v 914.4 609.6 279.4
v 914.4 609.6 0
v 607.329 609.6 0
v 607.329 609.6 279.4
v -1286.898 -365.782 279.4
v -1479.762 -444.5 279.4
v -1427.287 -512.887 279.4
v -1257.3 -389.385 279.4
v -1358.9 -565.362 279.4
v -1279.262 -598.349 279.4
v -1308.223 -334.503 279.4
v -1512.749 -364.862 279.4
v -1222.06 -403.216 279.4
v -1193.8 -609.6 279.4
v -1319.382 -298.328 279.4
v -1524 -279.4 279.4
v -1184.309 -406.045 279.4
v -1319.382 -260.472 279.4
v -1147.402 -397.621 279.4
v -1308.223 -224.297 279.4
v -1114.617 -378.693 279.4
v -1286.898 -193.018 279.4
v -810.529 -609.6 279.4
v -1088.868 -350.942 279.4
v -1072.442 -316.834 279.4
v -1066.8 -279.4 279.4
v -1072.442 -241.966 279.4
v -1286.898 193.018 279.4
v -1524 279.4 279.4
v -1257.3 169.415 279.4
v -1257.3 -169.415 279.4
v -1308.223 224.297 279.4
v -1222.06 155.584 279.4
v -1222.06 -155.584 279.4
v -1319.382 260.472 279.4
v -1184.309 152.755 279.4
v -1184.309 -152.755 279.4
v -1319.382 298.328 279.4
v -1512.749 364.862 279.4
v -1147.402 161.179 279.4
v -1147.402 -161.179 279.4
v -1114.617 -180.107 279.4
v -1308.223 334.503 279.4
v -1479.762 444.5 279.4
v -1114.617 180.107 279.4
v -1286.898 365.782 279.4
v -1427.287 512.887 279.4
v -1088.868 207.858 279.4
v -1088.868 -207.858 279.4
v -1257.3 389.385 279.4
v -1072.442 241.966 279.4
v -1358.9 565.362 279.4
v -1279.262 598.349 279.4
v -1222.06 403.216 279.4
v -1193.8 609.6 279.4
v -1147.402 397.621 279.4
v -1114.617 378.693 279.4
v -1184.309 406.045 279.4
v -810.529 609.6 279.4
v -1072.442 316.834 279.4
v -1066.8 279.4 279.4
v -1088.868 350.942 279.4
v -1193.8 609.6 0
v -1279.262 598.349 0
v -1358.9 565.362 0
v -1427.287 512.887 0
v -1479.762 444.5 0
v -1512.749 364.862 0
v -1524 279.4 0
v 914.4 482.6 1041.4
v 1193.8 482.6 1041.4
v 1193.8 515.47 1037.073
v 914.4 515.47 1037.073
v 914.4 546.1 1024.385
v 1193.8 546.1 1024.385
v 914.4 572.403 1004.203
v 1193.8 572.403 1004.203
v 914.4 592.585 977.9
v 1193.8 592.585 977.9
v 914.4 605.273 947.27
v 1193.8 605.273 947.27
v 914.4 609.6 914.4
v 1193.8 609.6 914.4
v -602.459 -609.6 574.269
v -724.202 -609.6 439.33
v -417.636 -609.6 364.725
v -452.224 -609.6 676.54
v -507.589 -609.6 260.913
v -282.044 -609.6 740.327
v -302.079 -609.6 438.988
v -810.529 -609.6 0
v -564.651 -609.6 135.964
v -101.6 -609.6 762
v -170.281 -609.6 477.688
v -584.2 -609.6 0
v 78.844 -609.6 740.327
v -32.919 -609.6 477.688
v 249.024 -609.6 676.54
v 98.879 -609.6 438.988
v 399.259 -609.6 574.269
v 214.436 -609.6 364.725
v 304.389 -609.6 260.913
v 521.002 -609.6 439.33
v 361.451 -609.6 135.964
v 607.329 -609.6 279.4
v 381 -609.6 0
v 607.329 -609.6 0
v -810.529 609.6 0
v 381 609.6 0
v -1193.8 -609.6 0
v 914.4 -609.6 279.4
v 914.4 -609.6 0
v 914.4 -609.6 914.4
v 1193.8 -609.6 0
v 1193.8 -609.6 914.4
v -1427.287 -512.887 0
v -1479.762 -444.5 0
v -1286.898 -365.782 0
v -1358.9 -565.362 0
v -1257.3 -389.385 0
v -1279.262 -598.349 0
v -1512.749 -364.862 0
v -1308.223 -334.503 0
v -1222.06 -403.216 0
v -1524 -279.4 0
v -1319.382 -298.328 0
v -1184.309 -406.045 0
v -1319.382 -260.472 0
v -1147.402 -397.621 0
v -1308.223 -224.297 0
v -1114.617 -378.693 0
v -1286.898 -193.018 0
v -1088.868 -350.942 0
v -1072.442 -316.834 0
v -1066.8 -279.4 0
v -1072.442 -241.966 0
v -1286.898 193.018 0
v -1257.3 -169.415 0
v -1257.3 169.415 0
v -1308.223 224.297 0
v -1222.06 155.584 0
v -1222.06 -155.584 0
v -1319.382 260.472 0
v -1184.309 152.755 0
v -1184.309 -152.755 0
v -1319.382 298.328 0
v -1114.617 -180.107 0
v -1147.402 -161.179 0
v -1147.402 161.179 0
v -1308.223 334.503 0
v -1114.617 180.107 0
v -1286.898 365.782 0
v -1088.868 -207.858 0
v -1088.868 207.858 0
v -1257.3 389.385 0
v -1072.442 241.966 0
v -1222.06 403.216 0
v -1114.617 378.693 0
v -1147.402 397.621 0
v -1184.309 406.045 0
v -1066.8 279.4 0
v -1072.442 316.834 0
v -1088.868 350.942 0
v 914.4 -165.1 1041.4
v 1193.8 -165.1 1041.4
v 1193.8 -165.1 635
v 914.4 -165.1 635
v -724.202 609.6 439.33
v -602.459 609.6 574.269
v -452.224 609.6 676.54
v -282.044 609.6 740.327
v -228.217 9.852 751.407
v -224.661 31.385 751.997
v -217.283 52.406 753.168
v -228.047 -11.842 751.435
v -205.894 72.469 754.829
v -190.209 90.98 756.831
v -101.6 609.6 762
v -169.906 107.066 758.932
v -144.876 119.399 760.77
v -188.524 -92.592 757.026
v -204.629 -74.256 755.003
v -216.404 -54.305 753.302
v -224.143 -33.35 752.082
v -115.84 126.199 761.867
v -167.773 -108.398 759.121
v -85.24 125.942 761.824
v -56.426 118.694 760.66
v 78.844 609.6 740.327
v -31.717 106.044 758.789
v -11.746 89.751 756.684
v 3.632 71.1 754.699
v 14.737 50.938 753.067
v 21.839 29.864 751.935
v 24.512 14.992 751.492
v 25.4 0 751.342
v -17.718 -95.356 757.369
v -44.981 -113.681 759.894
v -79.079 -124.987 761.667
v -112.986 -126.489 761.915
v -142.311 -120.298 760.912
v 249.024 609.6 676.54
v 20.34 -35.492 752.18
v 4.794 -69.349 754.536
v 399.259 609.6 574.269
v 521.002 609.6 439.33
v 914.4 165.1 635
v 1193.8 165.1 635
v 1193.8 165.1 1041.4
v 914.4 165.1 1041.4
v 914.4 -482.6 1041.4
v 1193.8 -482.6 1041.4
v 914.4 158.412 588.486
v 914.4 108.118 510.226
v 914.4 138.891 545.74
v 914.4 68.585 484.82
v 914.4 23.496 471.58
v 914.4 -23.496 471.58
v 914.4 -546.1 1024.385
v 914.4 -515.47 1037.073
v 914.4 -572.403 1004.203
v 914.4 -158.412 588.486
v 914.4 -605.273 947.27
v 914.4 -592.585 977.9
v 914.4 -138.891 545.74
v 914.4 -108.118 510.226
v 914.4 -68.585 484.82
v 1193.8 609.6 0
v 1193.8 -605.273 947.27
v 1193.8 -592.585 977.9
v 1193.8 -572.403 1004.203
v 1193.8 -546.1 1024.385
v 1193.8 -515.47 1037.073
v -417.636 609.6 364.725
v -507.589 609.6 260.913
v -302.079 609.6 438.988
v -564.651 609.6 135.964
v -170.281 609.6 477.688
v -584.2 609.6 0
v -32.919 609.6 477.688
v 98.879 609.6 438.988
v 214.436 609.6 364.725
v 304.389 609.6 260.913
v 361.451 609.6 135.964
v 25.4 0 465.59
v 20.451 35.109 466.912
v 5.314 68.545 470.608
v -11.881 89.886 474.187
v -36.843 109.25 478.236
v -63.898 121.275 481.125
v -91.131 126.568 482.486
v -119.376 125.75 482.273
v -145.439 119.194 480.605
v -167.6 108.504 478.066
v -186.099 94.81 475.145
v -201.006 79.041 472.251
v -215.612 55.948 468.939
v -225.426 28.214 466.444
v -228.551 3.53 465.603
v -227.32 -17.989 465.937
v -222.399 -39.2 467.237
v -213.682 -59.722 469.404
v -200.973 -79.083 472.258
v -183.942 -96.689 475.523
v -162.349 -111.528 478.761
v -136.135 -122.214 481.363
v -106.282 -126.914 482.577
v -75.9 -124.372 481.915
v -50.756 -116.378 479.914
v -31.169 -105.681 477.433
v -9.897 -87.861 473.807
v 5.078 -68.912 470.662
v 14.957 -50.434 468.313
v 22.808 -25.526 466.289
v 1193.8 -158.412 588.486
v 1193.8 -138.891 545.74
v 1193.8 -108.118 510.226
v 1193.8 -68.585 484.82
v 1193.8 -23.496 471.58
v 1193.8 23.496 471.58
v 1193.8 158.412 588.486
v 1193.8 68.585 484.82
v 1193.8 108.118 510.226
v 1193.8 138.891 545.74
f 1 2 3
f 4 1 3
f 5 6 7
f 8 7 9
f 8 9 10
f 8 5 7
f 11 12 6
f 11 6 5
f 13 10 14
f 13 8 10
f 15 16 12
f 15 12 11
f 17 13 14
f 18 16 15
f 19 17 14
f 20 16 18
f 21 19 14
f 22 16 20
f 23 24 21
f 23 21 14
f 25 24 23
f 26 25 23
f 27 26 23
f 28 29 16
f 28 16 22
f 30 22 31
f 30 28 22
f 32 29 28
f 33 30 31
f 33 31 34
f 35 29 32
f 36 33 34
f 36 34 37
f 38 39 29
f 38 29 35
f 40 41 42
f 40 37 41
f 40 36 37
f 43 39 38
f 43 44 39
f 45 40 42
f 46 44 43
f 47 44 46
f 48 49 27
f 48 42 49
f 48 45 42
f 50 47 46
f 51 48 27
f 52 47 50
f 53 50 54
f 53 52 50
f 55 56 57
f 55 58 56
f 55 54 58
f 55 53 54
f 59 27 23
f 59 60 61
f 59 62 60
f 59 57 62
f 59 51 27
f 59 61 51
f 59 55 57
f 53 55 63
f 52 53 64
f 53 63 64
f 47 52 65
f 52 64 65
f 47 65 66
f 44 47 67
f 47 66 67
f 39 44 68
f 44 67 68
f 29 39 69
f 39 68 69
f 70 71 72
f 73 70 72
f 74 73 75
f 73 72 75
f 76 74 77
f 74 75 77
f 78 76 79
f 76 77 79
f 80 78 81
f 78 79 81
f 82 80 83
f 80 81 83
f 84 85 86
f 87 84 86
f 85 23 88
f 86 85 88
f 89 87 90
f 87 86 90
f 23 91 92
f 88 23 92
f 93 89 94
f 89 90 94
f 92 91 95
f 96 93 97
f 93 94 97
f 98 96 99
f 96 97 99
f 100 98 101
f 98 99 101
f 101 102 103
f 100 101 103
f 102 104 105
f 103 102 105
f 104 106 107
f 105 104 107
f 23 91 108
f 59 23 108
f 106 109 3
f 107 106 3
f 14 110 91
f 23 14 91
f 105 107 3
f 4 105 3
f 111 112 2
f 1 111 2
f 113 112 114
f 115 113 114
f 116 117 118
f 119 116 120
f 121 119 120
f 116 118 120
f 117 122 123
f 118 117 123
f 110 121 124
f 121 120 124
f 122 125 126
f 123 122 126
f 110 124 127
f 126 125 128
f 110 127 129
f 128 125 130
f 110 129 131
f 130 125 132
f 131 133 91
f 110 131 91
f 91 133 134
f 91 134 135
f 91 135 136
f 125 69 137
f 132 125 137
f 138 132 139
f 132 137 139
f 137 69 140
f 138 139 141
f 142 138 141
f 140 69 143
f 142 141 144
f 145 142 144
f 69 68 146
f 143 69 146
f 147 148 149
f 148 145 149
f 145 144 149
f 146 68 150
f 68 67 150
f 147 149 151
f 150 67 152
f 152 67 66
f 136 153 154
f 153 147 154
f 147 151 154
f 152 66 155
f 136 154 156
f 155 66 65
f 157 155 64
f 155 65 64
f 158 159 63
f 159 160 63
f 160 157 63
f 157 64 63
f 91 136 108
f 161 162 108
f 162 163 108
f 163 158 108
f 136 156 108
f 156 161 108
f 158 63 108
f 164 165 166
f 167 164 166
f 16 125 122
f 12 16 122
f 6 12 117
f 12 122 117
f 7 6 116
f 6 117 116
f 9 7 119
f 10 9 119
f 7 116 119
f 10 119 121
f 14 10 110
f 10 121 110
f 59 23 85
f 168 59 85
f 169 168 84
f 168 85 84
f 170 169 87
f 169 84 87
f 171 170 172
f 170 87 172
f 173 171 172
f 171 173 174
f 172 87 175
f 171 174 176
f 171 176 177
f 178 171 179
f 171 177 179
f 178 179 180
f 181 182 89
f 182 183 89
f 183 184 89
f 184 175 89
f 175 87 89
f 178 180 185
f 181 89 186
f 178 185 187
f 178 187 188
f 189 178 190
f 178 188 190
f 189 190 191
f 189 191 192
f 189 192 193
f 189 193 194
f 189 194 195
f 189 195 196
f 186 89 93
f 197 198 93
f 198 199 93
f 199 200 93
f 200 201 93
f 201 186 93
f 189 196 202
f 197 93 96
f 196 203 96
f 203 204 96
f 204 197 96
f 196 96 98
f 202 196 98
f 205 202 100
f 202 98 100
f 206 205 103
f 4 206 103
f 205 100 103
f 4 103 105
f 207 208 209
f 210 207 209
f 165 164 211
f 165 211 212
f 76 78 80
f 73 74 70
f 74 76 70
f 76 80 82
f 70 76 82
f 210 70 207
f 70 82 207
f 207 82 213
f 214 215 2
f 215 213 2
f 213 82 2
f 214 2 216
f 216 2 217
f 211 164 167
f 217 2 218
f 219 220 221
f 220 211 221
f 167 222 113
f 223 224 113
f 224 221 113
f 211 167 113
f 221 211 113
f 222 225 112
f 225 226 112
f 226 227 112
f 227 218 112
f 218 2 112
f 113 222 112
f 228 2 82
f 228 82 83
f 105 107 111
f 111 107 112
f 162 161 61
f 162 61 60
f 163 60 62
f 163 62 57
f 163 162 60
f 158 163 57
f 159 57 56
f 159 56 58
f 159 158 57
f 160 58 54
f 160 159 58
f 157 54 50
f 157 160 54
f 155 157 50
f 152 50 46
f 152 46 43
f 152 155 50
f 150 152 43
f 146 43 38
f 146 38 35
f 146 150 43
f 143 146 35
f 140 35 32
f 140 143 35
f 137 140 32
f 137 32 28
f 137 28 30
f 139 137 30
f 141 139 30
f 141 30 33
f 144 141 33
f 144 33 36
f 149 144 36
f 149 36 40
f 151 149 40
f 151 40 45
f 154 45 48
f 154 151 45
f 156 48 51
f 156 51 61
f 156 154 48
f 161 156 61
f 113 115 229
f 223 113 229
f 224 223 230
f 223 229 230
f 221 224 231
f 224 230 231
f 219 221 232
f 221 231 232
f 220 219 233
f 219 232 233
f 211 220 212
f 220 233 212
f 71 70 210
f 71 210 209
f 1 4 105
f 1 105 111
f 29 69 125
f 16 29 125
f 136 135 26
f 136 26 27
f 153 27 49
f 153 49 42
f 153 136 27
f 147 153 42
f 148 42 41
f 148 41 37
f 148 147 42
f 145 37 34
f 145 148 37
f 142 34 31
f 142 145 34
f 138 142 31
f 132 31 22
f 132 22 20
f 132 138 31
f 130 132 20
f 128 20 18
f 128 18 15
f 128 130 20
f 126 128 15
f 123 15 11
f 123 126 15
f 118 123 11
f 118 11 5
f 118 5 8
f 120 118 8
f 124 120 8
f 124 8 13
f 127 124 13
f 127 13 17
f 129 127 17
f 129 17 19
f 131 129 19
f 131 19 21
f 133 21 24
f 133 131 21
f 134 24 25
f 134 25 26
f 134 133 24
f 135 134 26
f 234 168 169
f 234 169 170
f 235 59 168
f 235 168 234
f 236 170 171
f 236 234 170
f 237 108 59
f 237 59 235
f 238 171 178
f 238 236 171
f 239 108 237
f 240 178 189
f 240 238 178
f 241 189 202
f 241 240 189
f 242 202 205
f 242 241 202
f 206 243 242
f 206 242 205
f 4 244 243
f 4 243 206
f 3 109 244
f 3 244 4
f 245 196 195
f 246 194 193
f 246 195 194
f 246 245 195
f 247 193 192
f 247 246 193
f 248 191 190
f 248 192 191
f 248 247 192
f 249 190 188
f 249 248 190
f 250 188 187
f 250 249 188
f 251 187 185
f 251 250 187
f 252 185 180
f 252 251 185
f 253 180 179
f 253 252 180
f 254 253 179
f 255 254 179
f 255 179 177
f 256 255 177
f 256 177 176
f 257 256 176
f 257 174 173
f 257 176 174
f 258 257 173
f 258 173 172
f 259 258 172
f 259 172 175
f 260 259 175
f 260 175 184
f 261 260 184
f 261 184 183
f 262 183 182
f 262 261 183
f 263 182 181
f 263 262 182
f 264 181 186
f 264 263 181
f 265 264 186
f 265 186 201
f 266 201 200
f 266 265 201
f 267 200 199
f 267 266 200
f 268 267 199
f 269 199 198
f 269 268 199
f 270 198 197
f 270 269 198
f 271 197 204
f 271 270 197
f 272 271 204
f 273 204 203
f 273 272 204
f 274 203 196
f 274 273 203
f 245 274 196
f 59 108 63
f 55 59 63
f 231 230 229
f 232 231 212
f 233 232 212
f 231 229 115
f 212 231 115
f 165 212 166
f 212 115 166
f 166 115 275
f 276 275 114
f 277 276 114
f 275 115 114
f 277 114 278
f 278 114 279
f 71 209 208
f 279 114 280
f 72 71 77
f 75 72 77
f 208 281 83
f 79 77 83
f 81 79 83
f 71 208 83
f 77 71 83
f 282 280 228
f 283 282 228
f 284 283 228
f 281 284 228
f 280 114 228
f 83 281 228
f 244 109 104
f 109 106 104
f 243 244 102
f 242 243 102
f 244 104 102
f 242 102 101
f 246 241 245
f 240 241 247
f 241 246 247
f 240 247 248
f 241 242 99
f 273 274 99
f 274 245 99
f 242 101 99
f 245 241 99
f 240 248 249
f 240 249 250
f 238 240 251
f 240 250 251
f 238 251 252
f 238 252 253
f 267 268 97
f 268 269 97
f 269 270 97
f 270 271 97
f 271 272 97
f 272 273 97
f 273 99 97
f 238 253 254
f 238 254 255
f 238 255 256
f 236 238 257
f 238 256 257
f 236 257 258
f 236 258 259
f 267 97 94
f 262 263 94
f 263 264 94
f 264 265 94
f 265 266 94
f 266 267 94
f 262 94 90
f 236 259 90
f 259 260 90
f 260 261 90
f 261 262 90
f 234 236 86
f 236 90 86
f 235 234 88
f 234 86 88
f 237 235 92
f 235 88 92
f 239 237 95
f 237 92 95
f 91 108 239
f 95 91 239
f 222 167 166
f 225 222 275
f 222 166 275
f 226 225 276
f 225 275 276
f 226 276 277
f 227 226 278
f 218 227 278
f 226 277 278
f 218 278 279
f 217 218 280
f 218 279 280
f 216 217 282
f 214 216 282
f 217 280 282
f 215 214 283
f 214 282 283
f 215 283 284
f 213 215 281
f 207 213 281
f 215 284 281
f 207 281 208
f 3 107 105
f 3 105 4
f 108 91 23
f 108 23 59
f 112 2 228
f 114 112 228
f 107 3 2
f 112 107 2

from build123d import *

# Parameters (mm, degrees)
F1_W      = 53.071484662
F1_H      = 1219.2
F3_DEPTH  = 279.4
F1_W_2    = 279.4
F1_H_2    = 444.5
F1_H_3    = 330.2
F4_DEPTH  = 1041.4
F1_W_3    = 1417.857030676
F1_R      = 127
F5_DEPTH  = 762
F6_DEPTH  = 279.4
F7_DEPTH  = 15240
F9_DEPTH  = 139700
F11_DEPTH = 279.4


with BuildPart() as f3:
    # F1 (on Top) → F3 (new body)
    with BuildSketch(Plane.XY):
        Polygon((914.4, 165.1), (914.4, 609.6), (660.4, 609.6), (660.4, -609.6), (914.4, -609.6), (914.4, -165.1), align=None)
        with Locations((633.864257669, 0)):
            Rectangle(F1_W, F1_H)
    extrude(amount=F3_DEPTH)


with BuildPart() as f4:
    # F1 (on Top) → F4 (new body)
    with BuildSketch(Plane.XY):
        with Locations((1054.1, 387.35)):
            Rectangle(F1_W_2, F1_H_2)
        with Locations((1054.1, 0)):
            Rectangle(F1_W_2, F1_H_3)
        with Locations((1054.1, -387.35)):
            Rectangle(F1_W_2, F1_H_2)
    extrude(amount=F4_DEPTH)

    # F10 (on offset) → F11 (cut)
    with BuildSketch(Plane.YZ.offset(1193.8)):
        with BuildLine():
            Line((-609.6, 1041.4), (-609.6, 914.4))
            ThreePointArc((-609.6, 914.4), (-572.4025612107, 1004.2025612107), (-482.6, 1041.4))
            Line((-482.6, 1041.4), (-609.6, 1041.4))
        make_face()
        with BuildLine():
            ThreePointArc((482.6, 1041.4), (572.4025612107, 1004.2025612107), (609.6, 914.4))
            Line((609.6, 914.4), (609.6, 1041.4))
            Line((609.6, 1041.4), (482.6, 1041.4))
        make_face()
        with BuildLine():
            Line((165.1, 1041.4), (-165.1, 1041.4))
            Line((-165.1, 1041.4), (-165.1, 635))
            ThreePointArc((-165.1, 635), (0, 469.9), (165.1, 635))
            Line((165.1, 635), (165.1, 1041.4))
        make_face()
    extrude(amount=-F11_DEPTH, mode=Mode.SUBTRACT)


with BuildPart() as f5:
    # F1 (on Top) → F5 (new body)
    with BuildSketch(Plane.XY):
        with Locations((-101.6, 0)):
            Rectangle(F1_W_3, F1_H)
        with Locations((-101.6, 0)):
            Circle(F1_R, mode=Mode.SUBTRACT)
    extrude(amount=F5_DEPTH)

    # F2 (on Front) → F7 (cut, symmetric)
    with BuildSketch(Plane.XZ):
        with BuildLine():
            Line((-101.6, 0), (381, 0))
            ThreePointArc((381, 0), (239.6497326006, 341.2497326006), (-101.6, 482.6))
            Line((-101.6, 482.6), (-101.6, 0))
        make_face()
        with BuildLine():
            Line((-101.6, 0), (-101.6, 482.6))
            ThreePointArc((-101.6, 482.6), (-442.8497326006, 341.2497326006), (-584.2, 0))
            Line((-584.2, 0), (-101.6, 0))
        make_face()
        with BuildLine():
            ThreePointArc((-584.2, 0), (-101.6, -482.6), (381, 0))
            Line((381, 0), (-101.6, 0))
            Line((-101.6, 0), (-584.2, 0))
        make_face()
    extrude(amount=F7_DEPTH, both=True, mode=Mode.SUBTRACT)

    # F8 (on Front) → F9 (cut, symmetric)
    with BuildSketch(Plane.XZ):
        with BuildLine():
            ThreePointArc((-810.528515338, 279.4), (-530.4013543659, 629.8995144889), (-101.6000044108, 761.9999999077))
            Line((-101.6000044108, 762), (-810.528515338, 762))
            Line((-810.528515338, 762), (-810.528515338, 279.4))
        make_face()
        with BuildLine():
            ThreePointArc((-101.6000044108, 761.9999999077), (327.2013507198, 629.8995169709), (607.328515338, 279.4))
            Line((607.328515338, 279.4), (607.328515338, 762))
            Line((607.328515338, 762), (-101.6000044108, 762))
        make_face()
    extrude(amount=F9_DEPTH, both=True, mode=Mode.SUBTRACT)


with BuildPart() as f6:
    # F1 (on Top) → F6 (new body)
    with BuildSketch(Plane.XY):
        with BuildLine():
            Line((-810.528515338, -609.6), (-810.528515338, 609.6))
            Line((-810.528515338, 609.6), (-1193.8, 609.6))
            ThreePointArc((-1193.8, 609.6), (-1427.2866591478, 512.8866591478), (-1524, 279.4))
            Line((-1524, 279.4), (-1524, -279.4))
            ThreePointArc((-1524, -279.4), (-1427.2866591478, -512.8866591478), (-1193.8, -609.6))
            Line((-1193.8, -609.6), (-810.528515338, -609.6))
        make_face()
        with Locations((-1193.8, -279.4)):
            Circle(F1_R, mode=Mode.SUBTRACT)
        with Locations((-1193.8, 279.4)):
            Circle(F1_R, mode=Mode.SUBTRACT)
    extrude(amount=F6_DEPTH)


solid = Compound([f3.part, f4.part, f5.part, f6.part])
